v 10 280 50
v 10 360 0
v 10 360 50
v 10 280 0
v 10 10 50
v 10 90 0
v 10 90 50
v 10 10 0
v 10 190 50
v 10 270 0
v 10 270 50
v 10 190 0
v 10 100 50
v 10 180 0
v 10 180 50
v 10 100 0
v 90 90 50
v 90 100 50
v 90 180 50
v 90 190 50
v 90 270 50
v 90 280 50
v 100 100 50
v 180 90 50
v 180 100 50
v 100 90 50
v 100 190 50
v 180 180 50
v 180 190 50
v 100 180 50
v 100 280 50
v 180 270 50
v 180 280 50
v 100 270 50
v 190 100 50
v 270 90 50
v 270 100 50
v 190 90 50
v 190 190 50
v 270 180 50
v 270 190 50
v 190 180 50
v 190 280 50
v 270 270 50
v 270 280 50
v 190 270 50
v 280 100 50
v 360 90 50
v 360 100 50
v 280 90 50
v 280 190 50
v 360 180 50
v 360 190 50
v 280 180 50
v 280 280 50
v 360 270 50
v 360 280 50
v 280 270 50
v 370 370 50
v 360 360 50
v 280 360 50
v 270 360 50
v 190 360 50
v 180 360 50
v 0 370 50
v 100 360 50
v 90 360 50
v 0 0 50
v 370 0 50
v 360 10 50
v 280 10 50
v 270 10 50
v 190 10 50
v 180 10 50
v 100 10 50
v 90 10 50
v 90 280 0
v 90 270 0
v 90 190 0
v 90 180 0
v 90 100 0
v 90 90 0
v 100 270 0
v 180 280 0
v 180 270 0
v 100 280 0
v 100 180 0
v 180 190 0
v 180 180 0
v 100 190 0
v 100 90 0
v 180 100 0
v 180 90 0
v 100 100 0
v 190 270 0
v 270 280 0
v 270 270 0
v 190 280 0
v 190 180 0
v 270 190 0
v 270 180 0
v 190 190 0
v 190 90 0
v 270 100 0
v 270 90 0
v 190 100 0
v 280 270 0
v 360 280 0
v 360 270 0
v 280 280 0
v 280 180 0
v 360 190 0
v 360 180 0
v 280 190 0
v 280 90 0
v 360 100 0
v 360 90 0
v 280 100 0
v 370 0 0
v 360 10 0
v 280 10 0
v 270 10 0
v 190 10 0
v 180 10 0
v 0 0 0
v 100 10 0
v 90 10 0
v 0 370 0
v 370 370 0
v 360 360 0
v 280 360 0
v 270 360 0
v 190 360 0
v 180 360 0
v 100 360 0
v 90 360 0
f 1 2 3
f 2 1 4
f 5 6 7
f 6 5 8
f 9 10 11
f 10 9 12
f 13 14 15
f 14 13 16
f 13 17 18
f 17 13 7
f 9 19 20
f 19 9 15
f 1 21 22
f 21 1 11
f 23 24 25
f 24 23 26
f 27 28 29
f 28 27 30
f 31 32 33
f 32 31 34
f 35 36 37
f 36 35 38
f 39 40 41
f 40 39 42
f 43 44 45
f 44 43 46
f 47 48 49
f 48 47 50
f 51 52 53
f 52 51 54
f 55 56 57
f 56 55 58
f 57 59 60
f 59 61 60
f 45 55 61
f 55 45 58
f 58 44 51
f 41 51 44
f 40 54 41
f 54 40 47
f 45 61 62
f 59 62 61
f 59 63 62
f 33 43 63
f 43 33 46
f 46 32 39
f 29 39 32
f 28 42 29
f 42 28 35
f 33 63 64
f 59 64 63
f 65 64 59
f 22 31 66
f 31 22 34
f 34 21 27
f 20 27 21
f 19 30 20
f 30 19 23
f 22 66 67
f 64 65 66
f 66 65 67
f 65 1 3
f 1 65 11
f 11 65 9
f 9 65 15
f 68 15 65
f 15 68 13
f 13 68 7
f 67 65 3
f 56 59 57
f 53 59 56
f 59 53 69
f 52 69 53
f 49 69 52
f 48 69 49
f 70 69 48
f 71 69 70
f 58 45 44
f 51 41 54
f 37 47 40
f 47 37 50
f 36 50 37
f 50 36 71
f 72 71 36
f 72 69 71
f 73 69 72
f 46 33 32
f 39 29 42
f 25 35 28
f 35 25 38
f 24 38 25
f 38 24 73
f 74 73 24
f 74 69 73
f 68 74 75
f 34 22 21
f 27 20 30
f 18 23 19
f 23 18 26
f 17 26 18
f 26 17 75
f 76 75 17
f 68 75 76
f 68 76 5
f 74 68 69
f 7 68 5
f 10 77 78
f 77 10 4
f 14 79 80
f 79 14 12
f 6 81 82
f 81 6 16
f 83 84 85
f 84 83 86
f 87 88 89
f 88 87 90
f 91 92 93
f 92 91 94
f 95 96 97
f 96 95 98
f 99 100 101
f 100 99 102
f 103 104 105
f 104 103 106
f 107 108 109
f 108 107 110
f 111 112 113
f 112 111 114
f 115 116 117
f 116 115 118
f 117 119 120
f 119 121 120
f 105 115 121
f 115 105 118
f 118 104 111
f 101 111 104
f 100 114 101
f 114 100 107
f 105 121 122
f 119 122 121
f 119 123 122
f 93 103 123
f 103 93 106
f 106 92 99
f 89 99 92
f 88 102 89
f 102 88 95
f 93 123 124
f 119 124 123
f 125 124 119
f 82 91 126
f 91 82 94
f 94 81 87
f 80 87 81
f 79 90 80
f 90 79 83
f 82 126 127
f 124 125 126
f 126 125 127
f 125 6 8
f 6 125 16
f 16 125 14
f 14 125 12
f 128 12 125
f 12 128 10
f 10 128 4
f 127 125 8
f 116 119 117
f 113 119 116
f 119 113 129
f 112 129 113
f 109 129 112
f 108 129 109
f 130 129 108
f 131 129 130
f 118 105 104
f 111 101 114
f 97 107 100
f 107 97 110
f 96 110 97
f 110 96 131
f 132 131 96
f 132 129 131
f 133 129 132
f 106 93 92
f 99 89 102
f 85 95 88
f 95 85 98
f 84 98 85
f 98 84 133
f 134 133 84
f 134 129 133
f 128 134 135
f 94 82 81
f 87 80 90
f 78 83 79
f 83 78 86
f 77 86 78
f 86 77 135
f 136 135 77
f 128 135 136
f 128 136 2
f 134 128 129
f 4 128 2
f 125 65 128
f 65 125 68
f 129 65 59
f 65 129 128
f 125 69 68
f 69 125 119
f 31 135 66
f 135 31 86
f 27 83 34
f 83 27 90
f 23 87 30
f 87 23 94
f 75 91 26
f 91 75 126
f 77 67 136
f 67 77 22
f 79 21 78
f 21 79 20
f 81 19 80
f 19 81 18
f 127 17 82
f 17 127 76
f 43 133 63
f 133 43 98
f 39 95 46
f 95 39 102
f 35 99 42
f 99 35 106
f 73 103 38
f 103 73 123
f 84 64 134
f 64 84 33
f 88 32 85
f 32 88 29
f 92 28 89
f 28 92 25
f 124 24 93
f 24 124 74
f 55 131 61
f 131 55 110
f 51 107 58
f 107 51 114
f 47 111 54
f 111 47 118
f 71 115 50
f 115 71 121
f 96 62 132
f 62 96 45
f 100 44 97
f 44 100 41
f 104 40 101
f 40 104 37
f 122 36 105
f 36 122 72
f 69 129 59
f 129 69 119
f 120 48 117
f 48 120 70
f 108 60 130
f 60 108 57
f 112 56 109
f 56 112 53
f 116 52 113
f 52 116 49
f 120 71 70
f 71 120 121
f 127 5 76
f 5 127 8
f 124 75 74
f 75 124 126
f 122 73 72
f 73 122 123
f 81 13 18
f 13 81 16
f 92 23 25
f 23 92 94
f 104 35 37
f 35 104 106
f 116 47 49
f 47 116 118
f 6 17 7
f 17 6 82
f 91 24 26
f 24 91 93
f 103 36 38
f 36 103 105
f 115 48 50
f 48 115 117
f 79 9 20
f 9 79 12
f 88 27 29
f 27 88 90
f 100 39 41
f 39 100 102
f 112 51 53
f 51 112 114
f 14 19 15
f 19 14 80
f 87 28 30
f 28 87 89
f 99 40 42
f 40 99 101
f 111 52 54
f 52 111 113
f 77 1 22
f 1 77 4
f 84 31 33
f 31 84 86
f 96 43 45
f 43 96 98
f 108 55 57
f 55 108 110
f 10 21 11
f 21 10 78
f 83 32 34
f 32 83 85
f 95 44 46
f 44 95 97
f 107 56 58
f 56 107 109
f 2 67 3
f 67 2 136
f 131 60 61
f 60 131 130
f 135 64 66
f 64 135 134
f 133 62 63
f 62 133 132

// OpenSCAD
// OpenSCAD: One 50 mm-thick slice (370 x 370 x 50) of a 3D printed cage grid
// Grid: 5 bars along X (width 370, cross-section 10x10), 5 bars along Y (length 370), plus 4 corner vertical bars (Z-direction) with M6 clearance holes
// Parameters
t = 10;           // bar thickness (mm), square cross-section 10x10
g = 80;            // gap between adjacent bars (mm)
size = 370;         // outer footprint (X and Y) in mm
height_slice = 50;  // slice thickness along Z (mm)
hole_d = 6.5;      // through-hole diameter for M6 clearance (mm)
hole_r = hole_d/2;

module corner_bar_with_hole(cx, cy){
    // Corner bar: 10x10x50 with through-hole centered in the bar
    difference(){
        translate([cx, cy, 0]) cube([t, t, height_slice]);
        translate([cx + t/2, cy + t/2, 0]) cylinder(h=height_slice, r=hole_r, center=false);
    }
}

module grid_slice(){
    // Bars along Y (vertical strands in X direction)
    for(i=[0,1,2,3,4]){
        x = i*(t + g);
        translate([x, 0, 0]) cube([t, size, height_slice]);
    }
    // Bars along X (horizontal strands in Y direction)
    for(j=[0,1,2,3,4]){
        y = j*(t + g);
        translate([0, y, 0]) cube([size, t, height_slice]);
    }
    // Corner vertical bars with through-holes (Z-direction)
    corner_bar_with_hole(0, 0);           // bottom-left
    corner_bar_with_hole(size - t, 0);    // bottom-right (x=360)
    corner_bar_with_hole(0, size - t);    // top-left (y=360)
    corner_bar_with_hole(size - t, size - t); // top-right (x=360, y=360)
}

// Render one slice at its local origin (0,0,0)
grid_slice();
